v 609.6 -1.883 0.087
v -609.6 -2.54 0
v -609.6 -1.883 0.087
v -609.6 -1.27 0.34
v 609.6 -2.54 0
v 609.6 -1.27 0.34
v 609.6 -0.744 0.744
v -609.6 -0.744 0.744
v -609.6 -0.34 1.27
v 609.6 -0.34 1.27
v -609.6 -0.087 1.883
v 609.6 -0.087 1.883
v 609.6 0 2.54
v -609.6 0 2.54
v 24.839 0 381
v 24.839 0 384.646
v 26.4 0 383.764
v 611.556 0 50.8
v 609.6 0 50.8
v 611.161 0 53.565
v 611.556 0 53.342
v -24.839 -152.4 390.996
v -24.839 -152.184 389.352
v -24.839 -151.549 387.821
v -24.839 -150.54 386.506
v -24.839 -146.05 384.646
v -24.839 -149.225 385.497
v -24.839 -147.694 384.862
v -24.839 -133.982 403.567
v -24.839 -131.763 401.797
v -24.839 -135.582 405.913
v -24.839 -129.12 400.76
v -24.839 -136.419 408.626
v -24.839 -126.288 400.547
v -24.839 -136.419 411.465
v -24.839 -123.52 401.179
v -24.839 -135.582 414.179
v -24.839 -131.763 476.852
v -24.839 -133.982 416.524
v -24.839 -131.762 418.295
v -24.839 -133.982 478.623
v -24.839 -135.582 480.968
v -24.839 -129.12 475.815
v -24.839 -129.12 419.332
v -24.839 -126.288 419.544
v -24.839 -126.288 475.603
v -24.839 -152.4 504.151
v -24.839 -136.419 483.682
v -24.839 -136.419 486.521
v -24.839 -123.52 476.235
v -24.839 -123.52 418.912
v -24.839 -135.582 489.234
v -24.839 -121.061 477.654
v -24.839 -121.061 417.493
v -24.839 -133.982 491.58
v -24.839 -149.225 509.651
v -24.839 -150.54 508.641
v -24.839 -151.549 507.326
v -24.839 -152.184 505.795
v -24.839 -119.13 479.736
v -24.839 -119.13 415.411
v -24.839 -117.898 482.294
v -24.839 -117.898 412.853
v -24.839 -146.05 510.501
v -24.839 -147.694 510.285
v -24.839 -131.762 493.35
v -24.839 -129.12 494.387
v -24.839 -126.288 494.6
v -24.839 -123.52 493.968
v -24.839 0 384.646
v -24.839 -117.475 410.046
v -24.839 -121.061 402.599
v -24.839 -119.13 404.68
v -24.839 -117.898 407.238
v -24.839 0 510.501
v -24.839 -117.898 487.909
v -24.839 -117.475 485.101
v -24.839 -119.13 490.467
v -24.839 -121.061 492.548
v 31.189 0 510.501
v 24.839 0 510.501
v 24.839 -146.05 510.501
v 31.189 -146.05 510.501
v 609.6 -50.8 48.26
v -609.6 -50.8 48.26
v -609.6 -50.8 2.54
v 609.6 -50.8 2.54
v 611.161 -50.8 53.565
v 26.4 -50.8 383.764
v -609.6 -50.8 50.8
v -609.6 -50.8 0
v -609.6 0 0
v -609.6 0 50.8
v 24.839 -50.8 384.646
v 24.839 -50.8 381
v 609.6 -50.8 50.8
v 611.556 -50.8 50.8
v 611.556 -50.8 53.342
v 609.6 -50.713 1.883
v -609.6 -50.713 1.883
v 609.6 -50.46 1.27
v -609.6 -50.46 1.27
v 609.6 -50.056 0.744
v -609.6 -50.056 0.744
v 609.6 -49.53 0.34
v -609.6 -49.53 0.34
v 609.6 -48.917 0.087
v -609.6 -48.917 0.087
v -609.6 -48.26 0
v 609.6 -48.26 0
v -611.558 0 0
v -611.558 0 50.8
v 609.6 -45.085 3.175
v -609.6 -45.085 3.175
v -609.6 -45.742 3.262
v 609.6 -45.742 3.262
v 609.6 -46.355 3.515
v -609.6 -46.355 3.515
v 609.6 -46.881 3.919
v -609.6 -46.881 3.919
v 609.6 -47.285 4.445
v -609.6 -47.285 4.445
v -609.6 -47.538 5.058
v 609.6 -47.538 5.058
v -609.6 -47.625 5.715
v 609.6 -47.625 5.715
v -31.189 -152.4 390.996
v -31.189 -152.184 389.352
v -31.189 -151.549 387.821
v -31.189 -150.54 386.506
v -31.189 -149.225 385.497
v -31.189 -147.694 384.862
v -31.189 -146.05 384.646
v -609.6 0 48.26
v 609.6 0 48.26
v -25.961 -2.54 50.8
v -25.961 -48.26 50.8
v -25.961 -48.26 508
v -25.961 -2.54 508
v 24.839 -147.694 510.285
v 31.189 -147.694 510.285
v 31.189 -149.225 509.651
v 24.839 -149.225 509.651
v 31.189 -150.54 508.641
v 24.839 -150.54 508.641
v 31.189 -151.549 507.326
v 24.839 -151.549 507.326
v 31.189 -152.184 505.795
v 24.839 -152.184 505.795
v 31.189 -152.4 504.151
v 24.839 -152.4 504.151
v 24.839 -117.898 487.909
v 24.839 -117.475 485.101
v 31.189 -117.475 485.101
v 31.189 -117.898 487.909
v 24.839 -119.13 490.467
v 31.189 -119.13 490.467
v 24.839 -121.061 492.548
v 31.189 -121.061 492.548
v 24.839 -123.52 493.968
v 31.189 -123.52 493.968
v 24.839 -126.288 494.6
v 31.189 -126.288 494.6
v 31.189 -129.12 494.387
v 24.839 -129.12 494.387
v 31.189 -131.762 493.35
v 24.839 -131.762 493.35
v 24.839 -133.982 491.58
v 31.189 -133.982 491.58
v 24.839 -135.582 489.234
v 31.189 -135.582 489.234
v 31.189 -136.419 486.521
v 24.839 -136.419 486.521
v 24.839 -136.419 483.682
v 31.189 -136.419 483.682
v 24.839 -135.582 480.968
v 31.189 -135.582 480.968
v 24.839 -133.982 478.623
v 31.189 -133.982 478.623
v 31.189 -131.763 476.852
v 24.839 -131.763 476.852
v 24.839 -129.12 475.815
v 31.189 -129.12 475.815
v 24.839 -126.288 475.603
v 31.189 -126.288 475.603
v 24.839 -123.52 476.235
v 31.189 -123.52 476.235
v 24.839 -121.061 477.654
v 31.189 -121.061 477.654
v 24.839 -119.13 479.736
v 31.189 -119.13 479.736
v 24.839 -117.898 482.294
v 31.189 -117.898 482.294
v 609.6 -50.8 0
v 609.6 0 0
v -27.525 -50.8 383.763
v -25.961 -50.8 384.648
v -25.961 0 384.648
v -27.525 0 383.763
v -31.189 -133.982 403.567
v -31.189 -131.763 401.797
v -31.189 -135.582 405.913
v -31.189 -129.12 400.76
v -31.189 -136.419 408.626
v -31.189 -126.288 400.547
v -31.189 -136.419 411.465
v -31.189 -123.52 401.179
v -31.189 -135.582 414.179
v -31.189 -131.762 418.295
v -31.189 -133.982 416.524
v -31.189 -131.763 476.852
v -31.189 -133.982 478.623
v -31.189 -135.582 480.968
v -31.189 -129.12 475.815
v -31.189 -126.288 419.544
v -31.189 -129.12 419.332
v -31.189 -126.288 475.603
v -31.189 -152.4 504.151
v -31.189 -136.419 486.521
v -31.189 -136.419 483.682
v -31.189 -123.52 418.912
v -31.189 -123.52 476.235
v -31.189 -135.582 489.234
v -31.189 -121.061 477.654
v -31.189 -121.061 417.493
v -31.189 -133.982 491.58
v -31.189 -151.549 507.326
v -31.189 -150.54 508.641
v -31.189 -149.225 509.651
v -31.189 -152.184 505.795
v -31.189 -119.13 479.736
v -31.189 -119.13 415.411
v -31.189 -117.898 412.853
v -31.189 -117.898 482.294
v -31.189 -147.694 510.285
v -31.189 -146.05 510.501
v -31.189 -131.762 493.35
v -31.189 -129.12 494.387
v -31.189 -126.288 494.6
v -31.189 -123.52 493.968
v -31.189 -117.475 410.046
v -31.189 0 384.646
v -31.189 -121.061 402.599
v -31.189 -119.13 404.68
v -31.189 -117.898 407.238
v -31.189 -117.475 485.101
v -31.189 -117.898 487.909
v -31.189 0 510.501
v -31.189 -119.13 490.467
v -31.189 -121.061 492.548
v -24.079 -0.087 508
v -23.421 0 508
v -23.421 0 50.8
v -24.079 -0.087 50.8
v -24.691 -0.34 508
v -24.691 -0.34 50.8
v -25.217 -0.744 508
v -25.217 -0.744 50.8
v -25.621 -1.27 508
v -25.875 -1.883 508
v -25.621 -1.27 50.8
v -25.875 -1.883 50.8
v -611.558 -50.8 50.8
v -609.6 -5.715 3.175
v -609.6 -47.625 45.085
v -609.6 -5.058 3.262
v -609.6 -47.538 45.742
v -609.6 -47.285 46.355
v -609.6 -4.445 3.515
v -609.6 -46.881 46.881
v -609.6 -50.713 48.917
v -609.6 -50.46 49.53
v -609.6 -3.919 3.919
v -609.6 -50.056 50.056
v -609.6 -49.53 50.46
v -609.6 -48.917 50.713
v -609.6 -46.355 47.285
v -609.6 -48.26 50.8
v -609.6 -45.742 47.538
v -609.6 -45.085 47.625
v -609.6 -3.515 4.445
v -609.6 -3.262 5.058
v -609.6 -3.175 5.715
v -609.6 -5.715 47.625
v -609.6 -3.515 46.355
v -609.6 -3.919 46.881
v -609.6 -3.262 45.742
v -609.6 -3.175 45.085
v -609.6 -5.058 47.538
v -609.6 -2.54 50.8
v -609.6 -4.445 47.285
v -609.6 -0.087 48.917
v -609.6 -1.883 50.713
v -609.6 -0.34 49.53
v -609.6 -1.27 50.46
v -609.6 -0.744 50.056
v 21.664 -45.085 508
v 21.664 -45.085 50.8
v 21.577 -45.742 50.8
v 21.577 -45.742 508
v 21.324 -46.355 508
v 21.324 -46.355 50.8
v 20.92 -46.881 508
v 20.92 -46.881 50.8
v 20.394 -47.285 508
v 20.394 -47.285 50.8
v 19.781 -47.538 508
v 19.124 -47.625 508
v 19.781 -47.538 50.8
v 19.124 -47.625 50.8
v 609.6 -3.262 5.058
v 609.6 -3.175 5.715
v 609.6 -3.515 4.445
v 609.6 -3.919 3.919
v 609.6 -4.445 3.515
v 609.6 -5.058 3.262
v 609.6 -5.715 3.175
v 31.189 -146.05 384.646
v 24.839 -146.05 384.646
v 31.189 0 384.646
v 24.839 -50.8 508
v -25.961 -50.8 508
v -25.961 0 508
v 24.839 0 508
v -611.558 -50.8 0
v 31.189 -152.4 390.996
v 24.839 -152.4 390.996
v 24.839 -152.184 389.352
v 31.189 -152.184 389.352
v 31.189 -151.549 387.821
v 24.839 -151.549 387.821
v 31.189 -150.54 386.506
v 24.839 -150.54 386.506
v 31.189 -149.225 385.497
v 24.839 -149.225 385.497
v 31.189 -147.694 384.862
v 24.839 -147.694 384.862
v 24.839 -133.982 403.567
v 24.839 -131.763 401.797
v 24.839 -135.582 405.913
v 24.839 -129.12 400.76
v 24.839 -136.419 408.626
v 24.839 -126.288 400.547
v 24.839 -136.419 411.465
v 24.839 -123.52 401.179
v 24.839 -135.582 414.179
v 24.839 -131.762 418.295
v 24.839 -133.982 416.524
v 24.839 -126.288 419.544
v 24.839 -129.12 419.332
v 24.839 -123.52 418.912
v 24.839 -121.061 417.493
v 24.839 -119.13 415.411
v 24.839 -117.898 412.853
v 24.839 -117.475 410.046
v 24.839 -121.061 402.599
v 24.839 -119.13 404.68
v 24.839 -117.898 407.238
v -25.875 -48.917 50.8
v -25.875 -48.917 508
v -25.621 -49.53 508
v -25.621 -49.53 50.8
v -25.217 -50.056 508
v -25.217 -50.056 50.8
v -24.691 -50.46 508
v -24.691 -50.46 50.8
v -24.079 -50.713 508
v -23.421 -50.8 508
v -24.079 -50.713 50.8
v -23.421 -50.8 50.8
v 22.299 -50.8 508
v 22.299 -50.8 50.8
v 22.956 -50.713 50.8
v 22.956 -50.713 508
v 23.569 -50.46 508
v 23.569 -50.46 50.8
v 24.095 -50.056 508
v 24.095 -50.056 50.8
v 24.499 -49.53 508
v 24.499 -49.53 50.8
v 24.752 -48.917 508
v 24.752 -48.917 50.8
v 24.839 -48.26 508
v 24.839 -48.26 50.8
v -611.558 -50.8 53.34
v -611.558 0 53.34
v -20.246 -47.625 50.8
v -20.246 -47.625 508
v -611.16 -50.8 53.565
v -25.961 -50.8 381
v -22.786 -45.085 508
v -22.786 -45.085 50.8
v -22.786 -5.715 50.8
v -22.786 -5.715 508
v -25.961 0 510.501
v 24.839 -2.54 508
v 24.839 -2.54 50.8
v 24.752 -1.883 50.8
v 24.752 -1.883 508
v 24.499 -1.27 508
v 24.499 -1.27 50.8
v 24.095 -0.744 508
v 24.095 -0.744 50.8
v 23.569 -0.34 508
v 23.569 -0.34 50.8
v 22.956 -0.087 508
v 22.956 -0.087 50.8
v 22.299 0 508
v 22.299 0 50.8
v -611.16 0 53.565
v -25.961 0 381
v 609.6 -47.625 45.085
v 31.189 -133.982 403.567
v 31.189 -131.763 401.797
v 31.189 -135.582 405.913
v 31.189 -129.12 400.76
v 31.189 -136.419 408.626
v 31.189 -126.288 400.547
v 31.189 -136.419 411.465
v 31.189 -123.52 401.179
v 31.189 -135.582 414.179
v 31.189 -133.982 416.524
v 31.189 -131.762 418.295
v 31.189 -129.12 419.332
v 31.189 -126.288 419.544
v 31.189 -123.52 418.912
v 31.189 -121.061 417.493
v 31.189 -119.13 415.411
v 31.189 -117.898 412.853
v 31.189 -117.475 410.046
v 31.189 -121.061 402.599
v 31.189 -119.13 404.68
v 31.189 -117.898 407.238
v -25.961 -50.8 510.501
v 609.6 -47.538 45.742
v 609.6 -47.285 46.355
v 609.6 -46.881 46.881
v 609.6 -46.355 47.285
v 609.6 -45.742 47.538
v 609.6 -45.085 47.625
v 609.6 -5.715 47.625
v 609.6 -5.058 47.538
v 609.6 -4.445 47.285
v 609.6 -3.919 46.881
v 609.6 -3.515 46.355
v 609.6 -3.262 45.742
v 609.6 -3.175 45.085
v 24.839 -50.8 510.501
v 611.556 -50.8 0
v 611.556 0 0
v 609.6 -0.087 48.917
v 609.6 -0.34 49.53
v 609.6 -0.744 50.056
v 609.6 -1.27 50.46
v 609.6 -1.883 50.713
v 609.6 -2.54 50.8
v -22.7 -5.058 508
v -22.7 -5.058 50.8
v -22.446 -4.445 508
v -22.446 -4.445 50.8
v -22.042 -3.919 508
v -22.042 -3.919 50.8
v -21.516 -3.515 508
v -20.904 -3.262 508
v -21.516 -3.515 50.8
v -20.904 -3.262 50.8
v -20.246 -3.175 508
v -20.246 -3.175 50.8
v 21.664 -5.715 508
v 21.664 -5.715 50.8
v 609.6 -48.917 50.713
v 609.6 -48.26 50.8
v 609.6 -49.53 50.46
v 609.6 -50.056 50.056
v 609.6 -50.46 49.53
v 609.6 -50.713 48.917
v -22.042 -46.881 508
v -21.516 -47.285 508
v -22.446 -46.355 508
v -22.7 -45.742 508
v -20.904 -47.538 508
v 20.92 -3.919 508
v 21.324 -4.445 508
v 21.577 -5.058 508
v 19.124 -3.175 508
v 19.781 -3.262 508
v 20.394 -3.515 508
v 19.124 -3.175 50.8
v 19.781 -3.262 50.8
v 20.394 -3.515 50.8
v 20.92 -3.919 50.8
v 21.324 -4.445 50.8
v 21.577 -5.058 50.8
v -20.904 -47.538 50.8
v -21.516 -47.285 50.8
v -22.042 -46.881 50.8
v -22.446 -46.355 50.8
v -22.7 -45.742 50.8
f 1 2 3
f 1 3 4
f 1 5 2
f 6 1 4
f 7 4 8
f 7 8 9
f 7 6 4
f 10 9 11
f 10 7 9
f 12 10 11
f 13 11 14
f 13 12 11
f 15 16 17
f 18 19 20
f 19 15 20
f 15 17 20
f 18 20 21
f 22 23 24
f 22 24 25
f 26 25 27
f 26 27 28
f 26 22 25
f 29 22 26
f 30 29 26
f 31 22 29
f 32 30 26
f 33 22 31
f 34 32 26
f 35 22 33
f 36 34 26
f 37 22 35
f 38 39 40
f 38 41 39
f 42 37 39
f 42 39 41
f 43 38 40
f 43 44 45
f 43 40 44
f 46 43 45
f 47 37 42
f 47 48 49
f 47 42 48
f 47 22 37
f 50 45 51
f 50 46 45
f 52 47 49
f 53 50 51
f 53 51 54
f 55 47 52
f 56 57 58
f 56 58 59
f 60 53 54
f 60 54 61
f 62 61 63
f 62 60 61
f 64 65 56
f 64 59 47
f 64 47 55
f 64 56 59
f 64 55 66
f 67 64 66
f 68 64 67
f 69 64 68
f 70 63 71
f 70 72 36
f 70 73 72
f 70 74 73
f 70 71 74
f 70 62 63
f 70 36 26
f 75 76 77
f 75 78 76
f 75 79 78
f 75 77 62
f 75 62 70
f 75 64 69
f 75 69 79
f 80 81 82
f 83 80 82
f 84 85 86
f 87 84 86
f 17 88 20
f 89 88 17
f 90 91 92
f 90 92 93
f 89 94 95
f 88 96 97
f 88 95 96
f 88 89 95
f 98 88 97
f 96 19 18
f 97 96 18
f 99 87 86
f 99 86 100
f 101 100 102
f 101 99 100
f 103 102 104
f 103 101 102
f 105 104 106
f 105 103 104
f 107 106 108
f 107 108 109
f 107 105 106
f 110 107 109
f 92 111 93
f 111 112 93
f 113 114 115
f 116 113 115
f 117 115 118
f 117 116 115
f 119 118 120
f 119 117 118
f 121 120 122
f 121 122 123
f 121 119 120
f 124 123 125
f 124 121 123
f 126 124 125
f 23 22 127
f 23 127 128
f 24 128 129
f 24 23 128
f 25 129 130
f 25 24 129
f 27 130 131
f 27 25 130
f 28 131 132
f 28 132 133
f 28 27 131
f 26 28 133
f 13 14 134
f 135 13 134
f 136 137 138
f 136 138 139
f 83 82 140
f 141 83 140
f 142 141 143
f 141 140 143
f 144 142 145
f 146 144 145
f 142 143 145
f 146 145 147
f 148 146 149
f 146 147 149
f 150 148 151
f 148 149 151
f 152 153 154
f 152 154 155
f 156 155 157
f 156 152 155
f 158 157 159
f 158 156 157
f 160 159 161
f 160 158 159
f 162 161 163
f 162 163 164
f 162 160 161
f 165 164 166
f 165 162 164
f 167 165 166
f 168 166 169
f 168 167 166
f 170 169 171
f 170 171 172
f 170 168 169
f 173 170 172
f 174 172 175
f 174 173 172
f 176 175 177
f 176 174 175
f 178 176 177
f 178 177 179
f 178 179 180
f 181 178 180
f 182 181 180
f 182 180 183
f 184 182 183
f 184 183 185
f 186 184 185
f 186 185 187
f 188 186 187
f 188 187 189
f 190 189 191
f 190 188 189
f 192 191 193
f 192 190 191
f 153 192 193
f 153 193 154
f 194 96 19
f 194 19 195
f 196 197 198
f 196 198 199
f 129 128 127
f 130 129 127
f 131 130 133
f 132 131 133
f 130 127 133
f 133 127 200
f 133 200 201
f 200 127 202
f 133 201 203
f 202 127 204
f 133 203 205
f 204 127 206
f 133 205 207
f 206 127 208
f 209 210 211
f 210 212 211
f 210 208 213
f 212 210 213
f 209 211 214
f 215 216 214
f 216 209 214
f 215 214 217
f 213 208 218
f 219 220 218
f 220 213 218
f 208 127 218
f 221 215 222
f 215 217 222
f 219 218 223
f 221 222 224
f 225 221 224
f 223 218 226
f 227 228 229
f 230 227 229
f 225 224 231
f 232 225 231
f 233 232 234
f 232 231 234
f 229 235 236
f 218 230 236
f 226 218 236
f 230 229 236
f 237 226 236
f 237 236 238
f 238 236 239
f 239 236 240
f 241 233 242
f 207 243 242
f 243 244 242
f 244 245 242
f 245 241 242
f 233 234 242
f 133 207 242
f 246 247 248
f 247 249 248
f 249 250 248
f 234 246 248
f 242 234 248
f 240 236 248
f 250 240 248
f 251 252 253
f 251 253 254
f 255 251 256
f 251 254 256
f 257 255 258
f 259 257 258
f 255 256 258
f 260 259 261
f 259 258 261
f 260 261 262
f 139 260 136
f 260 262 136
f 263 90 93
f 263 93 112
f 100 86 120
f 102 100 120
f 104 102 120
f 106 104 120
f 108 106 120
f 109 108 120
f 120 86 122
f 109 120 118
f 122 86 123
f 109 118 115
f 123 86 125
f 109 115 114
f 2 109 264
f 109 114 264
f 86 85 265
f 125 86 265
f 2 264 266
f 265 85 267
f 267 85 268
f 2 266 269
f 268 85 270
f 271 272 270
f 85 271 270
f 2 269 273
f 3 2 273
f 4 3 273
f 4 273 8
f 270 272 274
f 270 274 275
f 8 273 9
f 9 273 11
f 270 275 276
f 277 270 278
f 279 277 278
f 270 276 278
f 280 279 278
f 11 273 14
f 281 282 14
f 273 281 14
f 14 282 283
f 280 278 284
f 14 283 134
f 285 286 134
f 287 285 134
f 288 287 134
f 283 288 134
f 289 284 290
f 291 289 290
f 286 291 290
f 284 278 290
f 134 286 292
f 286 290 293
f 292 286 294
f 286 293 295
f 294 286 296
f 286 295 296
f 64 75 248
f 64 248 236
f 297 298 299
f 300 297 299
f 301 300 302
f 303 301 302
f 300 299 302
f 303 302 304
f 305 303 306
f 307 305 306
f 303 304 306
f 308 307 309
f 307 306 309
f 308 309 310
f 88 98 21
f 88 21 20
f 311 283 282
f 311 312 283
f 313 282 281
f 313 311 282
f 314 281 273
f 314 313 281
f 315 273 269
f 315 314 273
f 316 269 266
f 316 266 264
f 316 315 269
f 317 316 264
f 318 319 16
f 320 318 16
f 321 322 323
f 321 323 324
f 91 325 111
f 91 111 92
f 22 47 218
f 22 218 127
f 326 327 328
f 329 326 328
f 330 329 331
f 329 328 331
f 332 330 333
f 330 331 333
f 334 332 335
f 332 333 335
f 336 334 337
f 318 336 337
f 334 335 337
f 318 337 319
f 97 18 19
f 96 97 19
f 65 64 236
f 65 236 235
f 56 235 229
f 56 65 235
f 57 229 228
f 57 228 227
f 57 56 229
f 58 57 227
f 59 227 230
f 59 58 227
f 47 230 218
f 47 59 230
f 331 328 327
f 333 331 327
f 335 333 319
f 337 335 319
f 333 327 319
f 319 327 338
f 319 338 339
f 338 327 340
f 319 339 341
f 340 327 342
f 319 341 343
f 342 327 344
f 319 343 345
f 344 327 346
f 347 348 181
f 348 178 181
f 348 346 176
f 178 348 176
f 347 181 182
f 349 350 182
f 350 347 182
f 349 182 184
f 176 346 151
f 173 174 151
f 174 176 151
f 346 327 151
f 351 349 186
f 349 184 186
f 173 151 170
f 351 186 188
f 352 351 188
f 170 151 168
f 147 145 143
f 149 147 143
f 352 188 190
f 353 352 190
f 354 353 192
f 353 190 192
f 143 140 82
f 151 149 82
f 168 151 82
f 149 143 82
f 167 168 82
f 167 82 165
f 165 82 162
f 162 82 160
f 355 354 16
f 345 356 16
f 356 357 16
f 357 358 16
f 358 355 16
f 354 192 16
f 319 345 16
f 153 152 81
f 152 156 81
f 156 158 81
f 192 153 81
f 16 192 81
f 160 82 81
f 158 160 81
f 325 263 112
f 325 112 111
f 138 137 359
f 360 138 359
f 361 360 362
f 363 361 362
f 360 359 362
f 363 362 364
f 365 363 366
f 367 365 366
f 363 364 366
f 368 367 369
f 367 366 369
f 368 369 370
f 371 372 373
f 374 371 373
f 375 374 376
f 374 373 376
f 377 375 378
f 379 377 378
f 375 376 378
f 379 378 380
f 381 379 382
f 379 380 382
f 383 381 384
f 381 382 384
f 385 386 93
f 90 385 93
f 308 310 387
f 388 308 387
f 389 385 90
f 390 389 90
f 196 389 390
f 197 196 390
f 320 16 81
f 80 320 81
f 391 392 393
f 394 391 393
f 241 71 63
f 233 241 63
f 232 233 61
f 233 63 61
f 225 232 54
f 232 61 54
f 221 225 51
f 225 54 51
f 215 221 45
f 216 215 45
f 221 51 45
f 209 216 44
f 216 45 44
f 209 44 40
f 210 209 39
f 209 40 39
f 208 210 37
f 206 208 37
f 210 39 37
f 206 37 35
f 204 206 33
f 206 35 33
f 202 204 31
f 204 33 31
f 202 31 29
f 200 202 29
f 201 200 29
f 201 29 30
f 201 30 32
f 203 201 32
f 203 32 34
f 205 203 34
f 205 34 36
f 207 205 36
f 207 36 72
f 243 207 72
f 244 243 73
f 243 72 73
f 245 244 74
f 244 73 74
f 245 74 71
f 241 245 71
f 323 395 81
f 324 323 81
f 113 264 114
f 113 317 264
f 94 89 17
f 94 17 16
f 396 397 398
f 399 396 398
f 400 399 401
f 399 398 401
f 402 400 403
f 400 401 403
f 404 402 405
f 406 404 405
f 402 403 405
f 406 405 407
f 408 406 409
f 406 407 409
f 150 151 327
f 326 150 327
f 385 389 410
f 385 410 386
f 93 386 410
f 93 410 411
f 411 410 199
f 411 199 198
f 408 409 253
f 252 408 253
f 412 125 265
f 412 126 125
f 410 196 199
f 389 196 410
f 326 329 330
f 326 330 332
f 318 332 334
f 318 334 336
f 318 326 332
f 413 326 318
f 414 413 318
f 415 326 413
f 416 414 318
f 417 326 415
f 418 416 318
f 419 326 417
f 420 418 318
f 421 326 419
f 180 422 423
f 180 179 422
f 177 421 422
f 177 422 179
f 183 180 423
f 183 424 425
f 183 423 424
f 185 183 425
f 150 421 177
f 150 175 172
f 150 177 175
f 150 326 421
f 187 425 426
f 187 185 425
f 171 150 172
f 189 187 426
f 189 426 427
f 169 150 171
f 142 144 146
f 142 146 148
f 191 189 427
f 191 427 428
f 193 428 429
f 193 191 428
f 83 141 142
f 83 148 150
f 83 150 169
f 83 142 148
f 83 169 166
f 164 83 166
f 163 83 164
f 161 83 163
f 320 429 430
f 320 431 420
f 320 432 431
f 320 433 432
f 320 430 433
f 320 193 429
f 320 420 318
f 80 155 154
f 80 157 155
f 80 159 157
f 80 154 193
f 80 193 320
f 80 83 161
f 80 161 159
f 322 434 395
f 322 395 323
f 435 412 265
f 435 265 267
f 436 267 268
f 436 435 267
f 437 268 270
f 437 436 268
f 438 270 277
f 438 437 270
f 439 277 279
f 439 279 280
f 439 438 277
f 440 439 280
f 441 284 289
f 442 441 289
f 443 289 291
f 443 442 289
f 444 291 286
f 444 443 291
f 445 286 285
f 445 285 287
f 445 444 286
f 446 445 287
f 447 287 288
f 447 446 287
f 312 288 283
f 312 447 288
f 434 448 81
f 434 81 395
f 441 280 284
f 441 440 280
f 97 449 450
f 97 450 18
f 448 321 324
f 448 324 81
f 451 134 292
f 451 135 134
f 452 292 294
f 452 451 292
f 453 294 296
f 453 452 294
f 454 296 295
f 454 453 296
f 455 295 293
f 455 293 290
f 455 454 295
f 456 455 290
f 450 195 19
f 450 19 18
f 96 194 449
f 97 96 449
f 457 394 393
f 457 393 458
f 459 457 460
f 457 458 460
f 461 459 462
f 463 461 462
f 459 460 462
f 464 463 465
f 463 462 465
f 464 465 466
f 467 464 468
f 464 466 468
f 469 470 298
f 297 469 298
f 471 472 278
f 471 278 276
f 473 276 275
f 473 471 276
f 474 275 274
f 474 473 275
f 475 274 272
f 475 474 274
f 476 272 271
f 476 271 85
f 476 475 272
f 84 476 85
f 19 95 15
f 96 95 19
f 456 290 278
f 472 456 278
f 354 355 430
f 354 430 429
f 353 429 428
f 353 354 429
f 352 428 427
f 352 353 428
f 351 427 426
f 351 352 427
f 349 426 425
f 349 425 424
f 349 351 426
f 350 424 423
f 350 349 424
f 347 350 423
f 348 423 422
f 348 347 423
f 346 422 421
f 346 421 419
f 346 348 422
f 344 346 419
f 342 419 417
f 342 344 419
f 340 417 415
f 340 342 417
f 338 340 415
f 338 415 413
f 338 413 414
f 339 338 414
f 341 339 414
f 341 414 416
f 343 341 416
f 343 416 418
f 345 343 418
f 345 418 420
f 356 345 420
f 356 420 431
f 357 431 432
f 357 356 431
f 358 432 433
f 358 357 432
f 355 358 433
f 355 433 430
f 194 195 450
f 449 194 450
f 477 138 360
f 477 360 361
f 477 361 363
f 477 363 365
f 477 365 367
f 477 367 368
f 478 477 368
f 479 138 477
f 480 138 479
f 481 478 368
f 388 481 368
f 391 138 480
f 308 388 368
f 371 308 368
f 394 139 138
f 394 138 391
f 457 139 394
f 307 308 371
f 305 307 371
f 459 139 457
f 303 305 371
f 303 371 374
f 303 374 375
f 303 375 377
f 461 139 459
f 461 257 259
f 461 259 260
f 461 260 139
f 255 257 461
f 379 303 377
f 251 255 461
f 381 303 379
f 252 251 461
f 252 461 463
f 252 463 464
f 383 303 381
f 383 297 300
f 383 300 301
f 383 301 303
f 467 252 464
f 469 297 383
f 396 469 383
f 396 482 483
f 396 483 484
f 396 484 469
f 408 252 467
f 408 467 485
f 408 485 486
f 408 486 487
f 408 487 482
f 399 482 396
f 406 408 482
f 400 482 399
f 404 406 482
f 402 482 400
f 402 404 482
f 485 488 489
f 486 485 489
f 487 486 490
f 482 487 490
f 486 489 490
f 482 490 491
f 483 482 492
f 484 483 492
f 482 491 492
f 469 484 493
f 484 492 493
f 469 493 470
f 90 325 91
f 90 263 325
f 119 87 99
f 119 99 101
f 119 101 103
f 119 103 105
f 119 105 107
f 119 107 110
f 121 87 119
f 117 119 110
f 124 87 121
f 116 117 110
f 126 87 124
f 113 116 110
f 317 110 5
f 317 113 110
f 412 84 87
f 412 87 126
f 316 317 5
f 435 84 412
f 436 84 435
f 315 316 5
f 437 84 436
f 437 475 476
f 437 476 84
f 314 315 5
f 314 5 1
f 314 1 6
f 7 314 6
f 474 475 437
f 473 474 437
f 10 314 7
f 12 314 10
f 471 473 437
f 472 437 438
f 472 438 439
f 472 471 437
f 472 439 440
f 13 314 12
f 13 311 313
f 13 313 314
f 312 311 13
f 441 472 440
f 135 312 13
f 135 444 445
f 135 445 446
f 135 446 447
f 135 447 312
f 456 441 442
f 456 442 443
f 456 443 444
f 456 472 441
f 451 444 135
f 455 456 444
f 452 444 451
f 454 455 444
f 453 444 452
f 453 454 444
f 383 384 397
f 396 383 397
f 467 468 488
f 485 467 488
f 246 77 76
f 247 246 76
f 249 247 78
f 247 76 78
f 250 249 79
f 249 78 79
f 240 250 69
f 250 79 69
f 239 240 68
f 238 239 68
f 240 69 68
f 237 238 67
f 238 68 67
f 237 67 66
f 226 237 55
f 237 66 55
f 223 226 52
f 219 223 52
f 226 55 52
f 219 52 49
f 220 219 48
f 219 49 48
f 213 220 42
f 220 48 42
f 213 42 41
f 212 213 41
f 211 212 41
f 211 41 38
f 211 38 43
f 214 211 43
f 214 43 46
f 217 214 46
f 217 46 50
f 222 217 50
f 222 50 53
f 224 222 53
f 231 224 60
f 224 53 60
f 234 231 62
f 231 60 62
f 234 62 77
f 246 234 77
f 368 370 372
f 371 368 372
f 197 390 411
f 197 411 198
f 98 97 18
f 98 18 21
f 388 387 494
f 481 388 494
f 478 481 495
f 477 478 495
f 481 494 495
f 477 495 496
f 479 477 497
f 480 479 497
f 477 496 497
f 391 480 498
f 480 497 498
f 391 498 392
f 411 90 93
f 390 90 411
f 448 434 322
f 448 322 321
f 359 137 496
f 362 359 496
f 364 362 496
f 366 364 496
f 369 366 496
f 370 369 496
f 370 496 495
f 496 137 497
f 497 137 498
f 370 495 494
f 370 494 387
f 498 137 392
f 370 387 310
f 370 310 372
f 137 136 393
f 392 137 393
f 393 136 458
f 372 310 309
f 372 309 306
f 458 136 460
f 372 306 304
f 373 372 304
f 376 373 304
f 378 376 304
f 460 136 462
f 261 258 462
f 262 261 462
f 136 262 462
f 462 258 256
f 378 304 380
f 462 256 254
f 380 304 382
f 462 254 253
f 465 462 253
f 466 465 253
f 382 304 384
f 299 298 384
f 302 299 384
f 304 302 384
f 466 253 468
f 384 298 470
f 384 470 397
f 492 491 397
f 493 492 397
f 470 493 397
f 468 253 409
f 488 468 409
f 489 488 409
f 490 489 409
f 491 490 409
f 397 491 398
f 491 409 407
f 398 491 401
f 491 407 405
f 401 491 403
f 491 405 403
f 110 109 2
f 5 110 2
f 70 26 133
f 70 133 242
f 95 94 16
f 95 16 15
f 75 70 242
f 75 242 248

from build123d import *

# Parameters (mm, degrees)
F1_DEPTH = 609.6
F2_W     = 50.8
F2_H     = 45.72
F3_DEPTH = 457.2
F5_DEPTH = 50.8
F6_DEPTH = 50.8
F7_R     = 9.525
F7_W     = 45.72
F7_H     = 123.354195476
F8_DEPTH = 6.35


with BuildPart() as f1:
    # F0 (on Right) → F1 (new body, symmetric)
    with BuildSketch(Plane.YZ):
        with BuildLine():
            Line((-2.54, 50.8), (-48.26, 50.8))
            ThreePointArc((-48.26, 50.8), (-50.0560512242, 50.0560512242), (-50.8, 48.26))
            Line((-50.8, 48.26), (-50.8, 2.54))
            ThreePointArc((-50.8, 2.54), (-50.0560512242, 0.7439487758), (-48.26, 0))
            Line((-48.26, 0), (-2.54, 0))
            ThreePointArc((-2.54, 0), (-0.7439487758, 0.7439487758), (0, 2.54))
            Line((0, 2.54), (0, 48.26))
            ThreePointArc((0, 48.26), (-0.7439487758, 50.0560512242), (-2.54, 50.8))
        make_face()
        with BuildLine():
            ThreePointArc((-47.625, 45.085), (-46.8810512242, 46.8810512242), (-45.085, 47.625))
            Line((-45.085, 47.625), (-5.715, 47.625))
            ThreePointArc((-5.715, 47.625), (-3.9189487758, 46.8810512242), (-3.175, 45.085))
            Line((-3.175, 45.085), (-3.175, 5.715))
            ThreePointArc((-3.175, 5.715), (-3.9189487758, 3.9189487758), (-5.715, 3.175))
            Line((-5.715, 3.175), (-45.085, 3.175))
            ThreePointArc((-45.085, 3.175), (-46.8810512242, 3.9189487758), (-47.625, 5.715))
            Line((-47.625, 5.715), (-47.625, 45.085))
        make_face(mode=Mode.SUBTRACT)
    extrude(amount=F1_DEPTH, both=True)


with BuildPart() as f3:
    # F2 (on face) → F3 (new body)
    with BuildSketch(Plane.XY.offset(50.8)):
        with Locations((-0.5611219996, -25.4)):
            Rectangle(F2_W, F2_H)
        with BuildLine():
            Line((-22.7861219996, -45.085), (-22.7861219996, -5.715))
            ThreePointArc((-22.7861219996, -5.715), (-22.0421732238, -3.9189487758), (-20.2461219996, -3.175))
            Line((-20.2461219996, -3.175), (19.1238780004, -3.175))
            ThreePointArc((19.1238780004, -3.175), (20.9199292246, -3.9189487758), (21.6638780004, -5.715))
            Line((21.6638780004, -5.715), (21.6638780004, -45.085))
            ThreePointArc((21.6638780004, -45.085), (20.9199292246, -46.8810512242), (19.1238780004, -47.625))
            Line((19.1238780004, -47.625), (-20.2461219996, -47.625))
            ThreePointArc((-20.2461219996, -47.625), (-22.0421732238, -46.8810512242), (-22.7861219996, -45.085))
        make_face(mode=Mode.SUBTRACT)
        with BuildLine():
            Line((24.8388780004, -48.26), (-25.9611219996, -48.26))
            ThreePointArc((-25.9611219996, -48.26), (-25.2171732238, -50.0560512242), (-23.4211219996, -50.8))
            Line((-23.4211219996, -50.8), (22.2988780004, -50.8))
            ThreePointArc((22.2988780004, -50.8), (24.0949292246, -50.0560512242), (24.8388780004, -48.26))
        make_face()
        with BuildLine():
            Line((22.2988780004, 0), (-23.4211219996, 0))
            ThreePointArc((-23.4211219996, 0), (-25.2171732238, -0.7439487758), (-25.9611219996, -2.54))
            Line((-25.9611219996, -2.54), (24.8388780004, -2.54))
            ThreePointArc((24.8388780004, -2.54), (24.0949292246, -0.7439487758), (22.2988780004, 0))
        make_face()
    extrude(amount=F3_DEPTH)


with BuildPart() as f5:
    # F4 (on face) → F5 (new body, through all)
    with BuildSketch(Plane.XZ.offset(50.8)):
        Polygon((609.6, 2.54), (609.6, 0), (611.555613627, 0), (611.555613627, 50.8), (609.6, 50.8), (609.6, 48.26), (609.6, 45.085), (609.6, 5.715), align=None)
    extrude(amount=-F5_DEPTH)


with BuildPart() as f5b:
    # F4 (on face) → F5, piece 2 (new body, through all)
    with BuildSketch(Plane.XZ.offset(50.8)):
        Polygon((-611.5579447979, 0), (-609.6, 0), (-609.6, 2.54), (-609.6, 48.26), (-609.6, 50.8), (-611.5579447979, 50.8), align=None)
    extrude(amount=-F5_DEPTH)


with BuildPart() as f5c:
    # F4 (on face) → F5, piece 3 (new body, through all)
    with BuildSketch(Plane.XZ.offset(50.8)):
        Polygon((22.2988780004, 508), (24.8388780004, 508), (24.8388780004, 510.501239761), (-25.9611219996, 510.501239761), (-25.9611219996, 508), (-23.4211219996, 508), align=None)
    extrude(amount=-F5_DEPTH)


with BuildPart() as f6:
    # F4 (on face) → F6 (new body, through all)
    with BuildSketch(Plane.XZ.offset(50.8)):
        Polygon((-611.5579447979, 53.3401869806), (-609.6, 50.8), (-25.9611219996, 380.9995868004), (-25.9611219996, 384.647500815), (-27.5245402519, 383.7629811567), (-611.1600160106, 53.5653192089), align=None)
    extrude(amount=-F6_DEPTH)


with BuildPart() as f6b:
    # F4 (on face) → F6, piece 2 (new body, through all)
    with BuildSketch(Plane.XZ.offset(50.8)):
        Polygon((609.6, 50.8), (611.555613627, 50.8), (611.555613627, 53.3419329357), (611.1611437555, 53.5646799407), (26.4000217559, 383.7642667412), (24.8388780004, 384.645804524), (24.8388780004, 380.9995868004), align=None)
    extrude(amount=-F6_DEPTH)


with BuildPart() as f8:
    # F7 (on face) → F8 (new body)
    with BuildSketch(Plane.YZ.offset(24.8388780004)):
        with BuildLine():
            Line((0, 384.645804524), (0, 508))
            Line((0, 508), (0, 510.501239761))
            Line((0, 510.501239761), (-50.8, 510.501239761))
            Line((-50.8, 510.501239761), (-146.05, 510.501239761))
            ThreePointArc((-146.05, 510.501239761), (-150.5401280605, 508.6413678215), (-152.4, 504.151239761))
            Line((-152.4, 504.151239761), (-152.4, 390.995804524))
            ThreePointArc((-152.4, 390.995804524), (-150.5401280605, 386.5056764635), (-146.05, 384.645804524))
            Line((-146.05, 384.645804524), (-50.8, 384.645804524))
            Line((-50.8, 384.645804524), (-48.26, 384.645804524))
            Line((-48.26, 384.645804524), (-48.26, 508))
            Line((-48.26, 508), (-2.54, 508))
            Line((-2.54, 508), (-2.54, 384.645804524))
            Line((-2.54, 384.645804524), (0, 384.645804524))
        make_face()
        with Locations((-127, 410.045804524)):
            Circle(F7_R, mode=Mode.SUBTRACT)
        with Locations((-127, 485.101239761)):
            Circle(F7_R, mode=Mode.SUBTRACT)
        with Locations((-25.4, 446.322902262)):
            Rectangle(F7_W, F7_H)
    extrude(amount=F8_DEPTH)


with BuildPart() as f9_1:
    # F9: instance of F8
    add(f8.part.mirror(Plane.YZ))


solid = Compound([f1.part, f3.part, f5.part, f5b.part, f5c.part, f6.part, f6b.part, f8.part, f9_1.part])
